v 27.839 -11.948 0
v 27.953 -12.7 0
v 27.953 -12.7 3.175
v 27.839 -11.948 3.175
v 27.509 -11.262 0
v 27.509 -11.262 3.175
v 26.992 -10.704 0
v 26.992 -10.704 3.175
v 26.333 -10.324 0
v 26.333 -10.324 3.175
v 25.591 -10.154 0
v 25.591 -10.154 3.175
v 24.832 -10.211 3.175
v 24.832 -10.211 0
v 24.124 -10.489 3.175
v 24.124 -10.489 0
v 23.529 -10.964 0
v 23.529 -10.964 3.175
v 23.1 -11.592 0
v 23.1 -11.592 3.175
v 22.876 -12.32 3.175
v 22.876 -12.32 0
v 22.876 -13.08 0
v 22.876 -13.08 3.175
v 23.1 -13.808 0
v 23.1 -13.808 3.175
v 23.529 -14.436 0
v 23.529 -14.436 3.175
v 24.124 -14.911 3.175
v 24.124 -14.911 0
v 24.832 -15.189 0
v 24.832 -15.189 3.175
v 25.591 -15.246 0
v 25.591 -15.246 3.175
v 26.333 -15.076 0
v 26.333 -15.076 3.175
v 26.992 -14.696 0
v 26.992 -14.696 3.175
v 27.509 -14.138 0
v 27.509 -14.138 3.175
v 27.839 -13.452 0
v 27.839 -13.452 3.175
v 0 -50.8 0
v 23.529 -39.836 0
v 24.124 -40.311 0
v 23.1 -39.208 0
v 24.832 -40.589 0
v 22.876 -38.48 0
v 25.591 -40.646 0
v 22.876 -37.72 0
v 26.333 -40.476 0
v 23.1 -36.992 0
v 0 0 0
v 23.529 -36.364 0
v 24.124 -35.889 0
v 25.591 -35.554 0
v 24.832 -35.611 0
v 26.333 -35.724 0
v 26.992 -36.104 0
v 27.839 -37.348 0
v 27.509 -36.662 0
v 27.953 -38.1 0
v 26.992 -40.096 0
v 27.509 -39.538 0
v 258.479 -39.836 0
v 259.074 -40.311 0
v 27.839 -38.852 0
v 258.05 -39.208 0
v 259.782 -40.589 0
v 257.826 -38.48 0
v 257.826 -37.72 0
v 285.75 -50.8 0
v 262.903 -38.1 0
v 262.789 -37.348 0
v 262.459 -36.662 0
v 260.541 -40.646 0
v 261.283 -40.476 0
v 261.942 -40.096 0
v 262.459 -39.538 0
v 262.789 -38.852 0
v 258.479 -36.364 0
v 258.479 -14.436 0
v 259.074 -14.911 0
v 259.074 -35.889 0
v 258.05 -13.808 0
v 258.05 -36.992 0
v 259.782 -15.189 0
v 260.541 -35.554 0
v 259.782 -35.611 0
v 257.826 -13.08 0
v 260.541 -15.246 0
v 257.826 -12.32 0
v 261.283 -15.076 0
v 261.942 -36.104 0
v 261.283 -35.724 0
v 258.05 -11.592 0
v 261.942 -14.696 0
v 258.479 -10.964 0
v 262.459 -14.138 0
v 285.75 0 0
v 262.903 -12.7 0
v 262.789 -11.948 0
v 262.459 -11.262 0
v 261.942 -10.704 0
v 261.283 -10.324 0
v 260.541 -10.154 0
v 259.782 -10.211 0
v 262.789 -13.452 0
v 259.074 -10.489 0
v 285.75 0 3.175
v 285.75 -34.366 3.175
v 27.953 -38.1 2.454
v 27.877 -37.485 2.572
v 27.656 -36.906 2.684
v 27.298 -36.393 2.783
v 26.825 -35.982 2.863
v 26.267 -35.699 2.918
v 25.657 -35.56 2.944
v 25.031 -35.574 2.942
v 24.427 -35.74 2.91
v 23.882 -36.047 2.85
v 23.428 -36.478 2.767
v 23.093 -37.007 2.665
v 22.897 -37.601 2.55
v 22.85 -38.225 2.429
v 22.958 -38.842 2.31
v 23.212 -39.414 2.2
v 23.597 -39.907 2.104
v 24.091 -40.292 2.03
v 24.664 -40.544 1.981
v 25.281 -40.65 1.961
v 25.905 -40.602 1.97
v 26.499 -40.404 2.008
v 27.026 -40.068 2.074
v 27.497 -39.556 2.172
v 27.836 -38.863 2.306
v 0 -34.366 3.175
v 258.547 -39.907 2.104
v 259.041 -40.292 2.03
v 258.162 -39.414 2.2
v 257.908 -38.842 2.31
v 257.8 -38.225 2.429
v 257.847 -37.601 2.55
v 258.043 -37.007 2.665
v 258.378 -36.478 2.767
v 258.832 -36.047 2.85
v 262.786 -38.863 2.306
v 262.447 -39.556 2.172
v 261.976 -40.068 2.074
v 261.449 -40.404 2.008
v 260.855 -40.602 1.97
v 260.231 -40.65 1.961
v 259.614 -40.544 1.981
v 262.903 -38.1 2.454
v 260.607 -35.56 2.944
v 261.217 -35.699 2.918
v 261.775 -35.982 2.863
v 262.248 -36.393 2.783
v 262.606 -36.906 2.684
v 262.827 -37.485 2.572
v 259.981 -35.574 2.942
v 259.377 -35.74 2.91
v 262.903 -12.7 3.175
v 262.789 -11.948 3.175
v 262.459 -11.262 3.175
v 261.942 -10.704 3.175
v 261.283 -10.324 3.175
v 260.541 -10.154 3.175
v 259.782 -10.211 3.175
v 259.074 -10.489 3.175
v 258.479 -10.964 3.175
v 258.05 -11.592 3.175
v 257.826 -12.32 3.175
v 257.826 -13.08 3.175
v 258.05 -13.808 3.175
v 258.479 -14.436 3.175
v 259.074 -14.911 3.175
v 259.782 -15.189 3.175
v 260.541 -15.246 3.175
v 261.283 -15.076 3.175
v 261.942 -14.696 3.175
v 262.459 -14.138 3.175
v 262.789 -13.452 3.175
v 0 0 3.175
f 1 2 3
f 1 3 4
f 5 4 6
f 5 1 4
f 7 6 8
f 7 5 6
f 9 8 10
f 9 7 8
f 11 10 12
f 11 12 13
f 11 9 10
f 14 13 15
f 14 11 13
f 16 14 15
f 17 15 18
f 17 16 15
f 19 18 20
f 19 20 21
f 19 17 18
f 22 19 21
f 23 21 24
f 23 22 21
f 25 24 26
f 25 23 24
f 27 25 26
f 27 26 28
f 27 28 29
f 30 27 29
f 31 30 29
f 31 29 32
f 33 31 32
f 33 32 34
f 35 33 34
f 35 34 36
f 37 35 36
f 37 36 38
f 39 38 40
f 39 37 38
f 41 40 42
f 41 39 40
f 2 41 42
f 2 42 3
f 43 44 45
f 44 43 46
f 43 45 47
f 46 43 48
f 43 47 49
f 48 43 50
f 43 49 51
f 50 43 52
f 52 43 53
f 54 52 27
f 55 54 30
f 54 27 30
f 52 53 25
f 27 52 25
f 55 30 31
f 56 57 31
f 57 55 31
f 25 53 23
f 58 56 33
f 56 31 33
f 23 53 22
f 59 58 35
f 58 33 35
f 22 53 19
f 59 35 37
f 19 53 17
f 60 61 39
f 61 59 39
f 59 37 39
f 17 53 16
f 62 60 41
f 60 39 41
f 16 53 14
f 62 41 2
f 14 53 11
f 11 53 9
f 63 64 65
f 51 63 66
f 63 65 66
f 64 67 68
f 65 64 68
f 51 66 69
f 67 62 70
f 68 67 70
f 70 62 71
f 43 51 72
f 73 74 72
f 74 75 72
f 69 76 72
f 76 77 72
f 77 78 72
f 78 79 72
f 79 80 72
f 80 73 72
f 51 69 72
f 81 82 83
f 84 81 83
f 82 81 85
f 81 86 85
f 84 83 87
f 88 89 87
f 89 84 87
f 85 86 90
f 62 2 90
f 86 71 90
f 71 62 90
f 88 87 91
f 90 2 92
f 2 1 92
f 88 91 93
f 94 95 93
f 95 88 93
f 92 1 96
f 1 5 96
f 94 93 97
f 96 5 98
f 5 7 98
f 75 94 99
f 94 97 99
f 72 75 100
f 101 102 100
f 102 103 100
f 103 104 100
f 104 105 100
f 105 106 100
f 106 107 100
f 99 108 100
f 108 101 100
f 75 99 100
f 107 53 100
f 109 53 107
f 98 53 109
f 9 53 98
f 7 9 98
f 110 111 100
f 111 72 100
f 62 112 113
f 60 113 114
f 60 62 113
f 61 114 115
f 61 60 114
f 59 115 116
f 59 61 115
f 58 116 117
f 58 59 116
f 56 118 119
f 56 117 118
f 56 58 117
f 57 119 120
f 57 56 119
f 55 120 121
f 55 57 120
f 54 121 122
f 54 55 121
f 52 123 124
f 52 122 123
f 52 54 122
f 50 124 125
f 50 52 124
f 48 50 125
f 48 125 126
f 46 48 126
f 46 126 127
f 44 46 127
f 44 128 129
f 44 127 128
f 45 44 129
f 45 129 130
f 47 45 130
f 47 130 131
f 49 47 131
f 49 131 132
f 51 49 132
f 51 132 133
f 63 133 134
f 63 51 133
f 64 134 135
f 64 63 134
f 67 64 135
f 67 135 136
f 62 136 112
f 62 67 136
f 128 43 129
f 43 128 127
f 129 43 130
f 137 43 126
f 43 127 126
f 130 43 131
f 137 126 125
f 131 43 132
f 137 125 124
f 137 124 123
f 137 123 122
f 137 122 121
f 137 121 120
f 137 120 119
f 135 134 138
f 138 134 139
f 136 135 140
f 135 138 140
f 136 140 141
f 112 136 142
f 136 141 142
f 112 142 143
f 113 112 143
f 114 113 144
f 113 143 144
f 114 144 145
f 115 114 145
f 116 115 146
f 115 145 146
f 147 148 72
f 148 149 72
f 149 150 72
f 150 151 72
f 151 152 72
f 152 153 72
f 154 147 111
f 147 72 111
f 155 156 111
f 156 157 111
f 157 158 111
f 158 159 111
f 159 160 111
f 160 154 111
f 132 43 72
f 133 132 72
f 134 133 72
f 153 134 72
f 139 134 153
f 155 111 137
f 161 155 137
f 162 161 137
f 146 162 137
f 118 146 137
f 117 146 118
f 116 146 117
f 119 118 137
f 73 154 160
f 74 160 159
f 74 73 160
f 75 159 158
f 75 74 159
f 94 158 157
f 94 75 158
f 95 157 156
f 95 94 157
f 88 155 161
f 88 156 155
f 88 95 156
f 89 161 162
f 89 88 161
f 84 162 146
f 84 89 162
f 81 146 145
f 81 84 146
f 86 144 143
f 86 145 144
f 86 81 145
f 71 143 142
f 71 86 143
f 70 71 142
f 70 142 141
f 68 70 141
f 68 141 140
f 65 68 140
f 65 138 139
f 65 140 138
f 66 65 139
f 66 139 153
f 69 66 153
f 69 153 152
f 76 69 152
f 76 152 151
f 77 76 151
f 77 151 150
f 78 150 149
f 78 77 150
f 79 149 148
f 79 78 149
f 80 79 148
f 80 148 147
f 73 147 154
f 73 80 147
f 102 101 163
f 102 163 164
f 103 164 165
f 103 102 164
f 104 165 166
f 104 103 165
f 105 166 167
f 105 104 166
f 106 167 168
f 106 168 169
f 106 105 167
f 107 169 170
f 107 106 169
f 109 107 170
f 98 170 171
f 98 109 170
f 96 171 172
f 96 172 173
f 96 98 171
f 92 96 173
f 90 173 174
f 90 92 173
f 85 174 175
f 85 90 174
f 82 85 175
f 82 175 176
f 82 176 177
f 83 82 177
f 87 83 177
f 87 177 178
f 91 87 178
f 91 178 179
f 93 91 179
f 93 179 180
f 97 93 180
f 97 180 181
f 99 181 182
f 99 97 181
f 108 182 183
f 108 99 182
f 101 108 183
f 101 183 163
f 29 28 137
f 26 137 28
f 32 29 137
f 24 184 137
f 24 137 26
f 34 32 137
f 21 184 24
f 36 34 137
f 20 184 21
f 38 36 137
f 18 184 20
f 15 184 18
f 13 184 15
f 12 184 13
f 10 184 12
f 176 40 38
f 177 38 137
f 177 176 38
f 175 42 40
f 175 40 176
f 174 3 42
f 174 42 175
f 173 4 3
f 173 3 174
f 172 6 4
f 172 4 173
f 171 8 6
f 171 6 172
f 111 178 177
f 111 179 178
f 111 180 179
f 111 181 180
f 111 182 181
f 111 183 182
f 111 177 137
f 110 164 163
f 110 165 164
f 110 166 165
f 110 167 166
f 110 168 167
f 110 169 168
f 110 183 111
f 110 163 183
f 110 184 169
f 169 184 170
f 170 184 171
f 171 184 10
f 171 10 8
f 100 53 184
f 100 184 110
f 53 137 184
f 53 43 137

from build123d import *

# Parameters (mm, degrees)
F0_W     = 285.75
F0_H     = 50.8
F0_R     = 2.5527
F1_DEPTH = 3.175
F3_DEPTH = 285.751


with BuildPart() as f1:
    # F0 (on Top) → F1 (new body)
    with BuildSketch(Plane.XY):
        with Locations((142.875, -25.4)):
            Rectangle(F0_W, F0_H)
        with Locations((25.4, -38.1)):
            Circle(F0_R, mode=Mode.SUBTRACT)
        with Locations((260.35, -38.1)):
            Circle(F0_R, mode=Mode.SUBTRACT)
        with Locations((25.4, -12.7)):
            Circle(F0_R, mode=Mode.SUBTRACT)
        with Locations((260.35, -12.7)):
            Circle(F0_R, mode=Mode.SUBTRACT)
    extrude(amount=F1_DEPTH)

    # F2 (on face) → F3 (cut, through all)
    with BuildSketch(Plane.YZ.offset(285.75)):
        Polygon((-50.8, 3.175), (-50.8, 0), (-34.366313, 3.175), align=None)
    extrude(amount=-F3_DEPTH, mode=Mode.SUBTRACT)


solid = f1.part
